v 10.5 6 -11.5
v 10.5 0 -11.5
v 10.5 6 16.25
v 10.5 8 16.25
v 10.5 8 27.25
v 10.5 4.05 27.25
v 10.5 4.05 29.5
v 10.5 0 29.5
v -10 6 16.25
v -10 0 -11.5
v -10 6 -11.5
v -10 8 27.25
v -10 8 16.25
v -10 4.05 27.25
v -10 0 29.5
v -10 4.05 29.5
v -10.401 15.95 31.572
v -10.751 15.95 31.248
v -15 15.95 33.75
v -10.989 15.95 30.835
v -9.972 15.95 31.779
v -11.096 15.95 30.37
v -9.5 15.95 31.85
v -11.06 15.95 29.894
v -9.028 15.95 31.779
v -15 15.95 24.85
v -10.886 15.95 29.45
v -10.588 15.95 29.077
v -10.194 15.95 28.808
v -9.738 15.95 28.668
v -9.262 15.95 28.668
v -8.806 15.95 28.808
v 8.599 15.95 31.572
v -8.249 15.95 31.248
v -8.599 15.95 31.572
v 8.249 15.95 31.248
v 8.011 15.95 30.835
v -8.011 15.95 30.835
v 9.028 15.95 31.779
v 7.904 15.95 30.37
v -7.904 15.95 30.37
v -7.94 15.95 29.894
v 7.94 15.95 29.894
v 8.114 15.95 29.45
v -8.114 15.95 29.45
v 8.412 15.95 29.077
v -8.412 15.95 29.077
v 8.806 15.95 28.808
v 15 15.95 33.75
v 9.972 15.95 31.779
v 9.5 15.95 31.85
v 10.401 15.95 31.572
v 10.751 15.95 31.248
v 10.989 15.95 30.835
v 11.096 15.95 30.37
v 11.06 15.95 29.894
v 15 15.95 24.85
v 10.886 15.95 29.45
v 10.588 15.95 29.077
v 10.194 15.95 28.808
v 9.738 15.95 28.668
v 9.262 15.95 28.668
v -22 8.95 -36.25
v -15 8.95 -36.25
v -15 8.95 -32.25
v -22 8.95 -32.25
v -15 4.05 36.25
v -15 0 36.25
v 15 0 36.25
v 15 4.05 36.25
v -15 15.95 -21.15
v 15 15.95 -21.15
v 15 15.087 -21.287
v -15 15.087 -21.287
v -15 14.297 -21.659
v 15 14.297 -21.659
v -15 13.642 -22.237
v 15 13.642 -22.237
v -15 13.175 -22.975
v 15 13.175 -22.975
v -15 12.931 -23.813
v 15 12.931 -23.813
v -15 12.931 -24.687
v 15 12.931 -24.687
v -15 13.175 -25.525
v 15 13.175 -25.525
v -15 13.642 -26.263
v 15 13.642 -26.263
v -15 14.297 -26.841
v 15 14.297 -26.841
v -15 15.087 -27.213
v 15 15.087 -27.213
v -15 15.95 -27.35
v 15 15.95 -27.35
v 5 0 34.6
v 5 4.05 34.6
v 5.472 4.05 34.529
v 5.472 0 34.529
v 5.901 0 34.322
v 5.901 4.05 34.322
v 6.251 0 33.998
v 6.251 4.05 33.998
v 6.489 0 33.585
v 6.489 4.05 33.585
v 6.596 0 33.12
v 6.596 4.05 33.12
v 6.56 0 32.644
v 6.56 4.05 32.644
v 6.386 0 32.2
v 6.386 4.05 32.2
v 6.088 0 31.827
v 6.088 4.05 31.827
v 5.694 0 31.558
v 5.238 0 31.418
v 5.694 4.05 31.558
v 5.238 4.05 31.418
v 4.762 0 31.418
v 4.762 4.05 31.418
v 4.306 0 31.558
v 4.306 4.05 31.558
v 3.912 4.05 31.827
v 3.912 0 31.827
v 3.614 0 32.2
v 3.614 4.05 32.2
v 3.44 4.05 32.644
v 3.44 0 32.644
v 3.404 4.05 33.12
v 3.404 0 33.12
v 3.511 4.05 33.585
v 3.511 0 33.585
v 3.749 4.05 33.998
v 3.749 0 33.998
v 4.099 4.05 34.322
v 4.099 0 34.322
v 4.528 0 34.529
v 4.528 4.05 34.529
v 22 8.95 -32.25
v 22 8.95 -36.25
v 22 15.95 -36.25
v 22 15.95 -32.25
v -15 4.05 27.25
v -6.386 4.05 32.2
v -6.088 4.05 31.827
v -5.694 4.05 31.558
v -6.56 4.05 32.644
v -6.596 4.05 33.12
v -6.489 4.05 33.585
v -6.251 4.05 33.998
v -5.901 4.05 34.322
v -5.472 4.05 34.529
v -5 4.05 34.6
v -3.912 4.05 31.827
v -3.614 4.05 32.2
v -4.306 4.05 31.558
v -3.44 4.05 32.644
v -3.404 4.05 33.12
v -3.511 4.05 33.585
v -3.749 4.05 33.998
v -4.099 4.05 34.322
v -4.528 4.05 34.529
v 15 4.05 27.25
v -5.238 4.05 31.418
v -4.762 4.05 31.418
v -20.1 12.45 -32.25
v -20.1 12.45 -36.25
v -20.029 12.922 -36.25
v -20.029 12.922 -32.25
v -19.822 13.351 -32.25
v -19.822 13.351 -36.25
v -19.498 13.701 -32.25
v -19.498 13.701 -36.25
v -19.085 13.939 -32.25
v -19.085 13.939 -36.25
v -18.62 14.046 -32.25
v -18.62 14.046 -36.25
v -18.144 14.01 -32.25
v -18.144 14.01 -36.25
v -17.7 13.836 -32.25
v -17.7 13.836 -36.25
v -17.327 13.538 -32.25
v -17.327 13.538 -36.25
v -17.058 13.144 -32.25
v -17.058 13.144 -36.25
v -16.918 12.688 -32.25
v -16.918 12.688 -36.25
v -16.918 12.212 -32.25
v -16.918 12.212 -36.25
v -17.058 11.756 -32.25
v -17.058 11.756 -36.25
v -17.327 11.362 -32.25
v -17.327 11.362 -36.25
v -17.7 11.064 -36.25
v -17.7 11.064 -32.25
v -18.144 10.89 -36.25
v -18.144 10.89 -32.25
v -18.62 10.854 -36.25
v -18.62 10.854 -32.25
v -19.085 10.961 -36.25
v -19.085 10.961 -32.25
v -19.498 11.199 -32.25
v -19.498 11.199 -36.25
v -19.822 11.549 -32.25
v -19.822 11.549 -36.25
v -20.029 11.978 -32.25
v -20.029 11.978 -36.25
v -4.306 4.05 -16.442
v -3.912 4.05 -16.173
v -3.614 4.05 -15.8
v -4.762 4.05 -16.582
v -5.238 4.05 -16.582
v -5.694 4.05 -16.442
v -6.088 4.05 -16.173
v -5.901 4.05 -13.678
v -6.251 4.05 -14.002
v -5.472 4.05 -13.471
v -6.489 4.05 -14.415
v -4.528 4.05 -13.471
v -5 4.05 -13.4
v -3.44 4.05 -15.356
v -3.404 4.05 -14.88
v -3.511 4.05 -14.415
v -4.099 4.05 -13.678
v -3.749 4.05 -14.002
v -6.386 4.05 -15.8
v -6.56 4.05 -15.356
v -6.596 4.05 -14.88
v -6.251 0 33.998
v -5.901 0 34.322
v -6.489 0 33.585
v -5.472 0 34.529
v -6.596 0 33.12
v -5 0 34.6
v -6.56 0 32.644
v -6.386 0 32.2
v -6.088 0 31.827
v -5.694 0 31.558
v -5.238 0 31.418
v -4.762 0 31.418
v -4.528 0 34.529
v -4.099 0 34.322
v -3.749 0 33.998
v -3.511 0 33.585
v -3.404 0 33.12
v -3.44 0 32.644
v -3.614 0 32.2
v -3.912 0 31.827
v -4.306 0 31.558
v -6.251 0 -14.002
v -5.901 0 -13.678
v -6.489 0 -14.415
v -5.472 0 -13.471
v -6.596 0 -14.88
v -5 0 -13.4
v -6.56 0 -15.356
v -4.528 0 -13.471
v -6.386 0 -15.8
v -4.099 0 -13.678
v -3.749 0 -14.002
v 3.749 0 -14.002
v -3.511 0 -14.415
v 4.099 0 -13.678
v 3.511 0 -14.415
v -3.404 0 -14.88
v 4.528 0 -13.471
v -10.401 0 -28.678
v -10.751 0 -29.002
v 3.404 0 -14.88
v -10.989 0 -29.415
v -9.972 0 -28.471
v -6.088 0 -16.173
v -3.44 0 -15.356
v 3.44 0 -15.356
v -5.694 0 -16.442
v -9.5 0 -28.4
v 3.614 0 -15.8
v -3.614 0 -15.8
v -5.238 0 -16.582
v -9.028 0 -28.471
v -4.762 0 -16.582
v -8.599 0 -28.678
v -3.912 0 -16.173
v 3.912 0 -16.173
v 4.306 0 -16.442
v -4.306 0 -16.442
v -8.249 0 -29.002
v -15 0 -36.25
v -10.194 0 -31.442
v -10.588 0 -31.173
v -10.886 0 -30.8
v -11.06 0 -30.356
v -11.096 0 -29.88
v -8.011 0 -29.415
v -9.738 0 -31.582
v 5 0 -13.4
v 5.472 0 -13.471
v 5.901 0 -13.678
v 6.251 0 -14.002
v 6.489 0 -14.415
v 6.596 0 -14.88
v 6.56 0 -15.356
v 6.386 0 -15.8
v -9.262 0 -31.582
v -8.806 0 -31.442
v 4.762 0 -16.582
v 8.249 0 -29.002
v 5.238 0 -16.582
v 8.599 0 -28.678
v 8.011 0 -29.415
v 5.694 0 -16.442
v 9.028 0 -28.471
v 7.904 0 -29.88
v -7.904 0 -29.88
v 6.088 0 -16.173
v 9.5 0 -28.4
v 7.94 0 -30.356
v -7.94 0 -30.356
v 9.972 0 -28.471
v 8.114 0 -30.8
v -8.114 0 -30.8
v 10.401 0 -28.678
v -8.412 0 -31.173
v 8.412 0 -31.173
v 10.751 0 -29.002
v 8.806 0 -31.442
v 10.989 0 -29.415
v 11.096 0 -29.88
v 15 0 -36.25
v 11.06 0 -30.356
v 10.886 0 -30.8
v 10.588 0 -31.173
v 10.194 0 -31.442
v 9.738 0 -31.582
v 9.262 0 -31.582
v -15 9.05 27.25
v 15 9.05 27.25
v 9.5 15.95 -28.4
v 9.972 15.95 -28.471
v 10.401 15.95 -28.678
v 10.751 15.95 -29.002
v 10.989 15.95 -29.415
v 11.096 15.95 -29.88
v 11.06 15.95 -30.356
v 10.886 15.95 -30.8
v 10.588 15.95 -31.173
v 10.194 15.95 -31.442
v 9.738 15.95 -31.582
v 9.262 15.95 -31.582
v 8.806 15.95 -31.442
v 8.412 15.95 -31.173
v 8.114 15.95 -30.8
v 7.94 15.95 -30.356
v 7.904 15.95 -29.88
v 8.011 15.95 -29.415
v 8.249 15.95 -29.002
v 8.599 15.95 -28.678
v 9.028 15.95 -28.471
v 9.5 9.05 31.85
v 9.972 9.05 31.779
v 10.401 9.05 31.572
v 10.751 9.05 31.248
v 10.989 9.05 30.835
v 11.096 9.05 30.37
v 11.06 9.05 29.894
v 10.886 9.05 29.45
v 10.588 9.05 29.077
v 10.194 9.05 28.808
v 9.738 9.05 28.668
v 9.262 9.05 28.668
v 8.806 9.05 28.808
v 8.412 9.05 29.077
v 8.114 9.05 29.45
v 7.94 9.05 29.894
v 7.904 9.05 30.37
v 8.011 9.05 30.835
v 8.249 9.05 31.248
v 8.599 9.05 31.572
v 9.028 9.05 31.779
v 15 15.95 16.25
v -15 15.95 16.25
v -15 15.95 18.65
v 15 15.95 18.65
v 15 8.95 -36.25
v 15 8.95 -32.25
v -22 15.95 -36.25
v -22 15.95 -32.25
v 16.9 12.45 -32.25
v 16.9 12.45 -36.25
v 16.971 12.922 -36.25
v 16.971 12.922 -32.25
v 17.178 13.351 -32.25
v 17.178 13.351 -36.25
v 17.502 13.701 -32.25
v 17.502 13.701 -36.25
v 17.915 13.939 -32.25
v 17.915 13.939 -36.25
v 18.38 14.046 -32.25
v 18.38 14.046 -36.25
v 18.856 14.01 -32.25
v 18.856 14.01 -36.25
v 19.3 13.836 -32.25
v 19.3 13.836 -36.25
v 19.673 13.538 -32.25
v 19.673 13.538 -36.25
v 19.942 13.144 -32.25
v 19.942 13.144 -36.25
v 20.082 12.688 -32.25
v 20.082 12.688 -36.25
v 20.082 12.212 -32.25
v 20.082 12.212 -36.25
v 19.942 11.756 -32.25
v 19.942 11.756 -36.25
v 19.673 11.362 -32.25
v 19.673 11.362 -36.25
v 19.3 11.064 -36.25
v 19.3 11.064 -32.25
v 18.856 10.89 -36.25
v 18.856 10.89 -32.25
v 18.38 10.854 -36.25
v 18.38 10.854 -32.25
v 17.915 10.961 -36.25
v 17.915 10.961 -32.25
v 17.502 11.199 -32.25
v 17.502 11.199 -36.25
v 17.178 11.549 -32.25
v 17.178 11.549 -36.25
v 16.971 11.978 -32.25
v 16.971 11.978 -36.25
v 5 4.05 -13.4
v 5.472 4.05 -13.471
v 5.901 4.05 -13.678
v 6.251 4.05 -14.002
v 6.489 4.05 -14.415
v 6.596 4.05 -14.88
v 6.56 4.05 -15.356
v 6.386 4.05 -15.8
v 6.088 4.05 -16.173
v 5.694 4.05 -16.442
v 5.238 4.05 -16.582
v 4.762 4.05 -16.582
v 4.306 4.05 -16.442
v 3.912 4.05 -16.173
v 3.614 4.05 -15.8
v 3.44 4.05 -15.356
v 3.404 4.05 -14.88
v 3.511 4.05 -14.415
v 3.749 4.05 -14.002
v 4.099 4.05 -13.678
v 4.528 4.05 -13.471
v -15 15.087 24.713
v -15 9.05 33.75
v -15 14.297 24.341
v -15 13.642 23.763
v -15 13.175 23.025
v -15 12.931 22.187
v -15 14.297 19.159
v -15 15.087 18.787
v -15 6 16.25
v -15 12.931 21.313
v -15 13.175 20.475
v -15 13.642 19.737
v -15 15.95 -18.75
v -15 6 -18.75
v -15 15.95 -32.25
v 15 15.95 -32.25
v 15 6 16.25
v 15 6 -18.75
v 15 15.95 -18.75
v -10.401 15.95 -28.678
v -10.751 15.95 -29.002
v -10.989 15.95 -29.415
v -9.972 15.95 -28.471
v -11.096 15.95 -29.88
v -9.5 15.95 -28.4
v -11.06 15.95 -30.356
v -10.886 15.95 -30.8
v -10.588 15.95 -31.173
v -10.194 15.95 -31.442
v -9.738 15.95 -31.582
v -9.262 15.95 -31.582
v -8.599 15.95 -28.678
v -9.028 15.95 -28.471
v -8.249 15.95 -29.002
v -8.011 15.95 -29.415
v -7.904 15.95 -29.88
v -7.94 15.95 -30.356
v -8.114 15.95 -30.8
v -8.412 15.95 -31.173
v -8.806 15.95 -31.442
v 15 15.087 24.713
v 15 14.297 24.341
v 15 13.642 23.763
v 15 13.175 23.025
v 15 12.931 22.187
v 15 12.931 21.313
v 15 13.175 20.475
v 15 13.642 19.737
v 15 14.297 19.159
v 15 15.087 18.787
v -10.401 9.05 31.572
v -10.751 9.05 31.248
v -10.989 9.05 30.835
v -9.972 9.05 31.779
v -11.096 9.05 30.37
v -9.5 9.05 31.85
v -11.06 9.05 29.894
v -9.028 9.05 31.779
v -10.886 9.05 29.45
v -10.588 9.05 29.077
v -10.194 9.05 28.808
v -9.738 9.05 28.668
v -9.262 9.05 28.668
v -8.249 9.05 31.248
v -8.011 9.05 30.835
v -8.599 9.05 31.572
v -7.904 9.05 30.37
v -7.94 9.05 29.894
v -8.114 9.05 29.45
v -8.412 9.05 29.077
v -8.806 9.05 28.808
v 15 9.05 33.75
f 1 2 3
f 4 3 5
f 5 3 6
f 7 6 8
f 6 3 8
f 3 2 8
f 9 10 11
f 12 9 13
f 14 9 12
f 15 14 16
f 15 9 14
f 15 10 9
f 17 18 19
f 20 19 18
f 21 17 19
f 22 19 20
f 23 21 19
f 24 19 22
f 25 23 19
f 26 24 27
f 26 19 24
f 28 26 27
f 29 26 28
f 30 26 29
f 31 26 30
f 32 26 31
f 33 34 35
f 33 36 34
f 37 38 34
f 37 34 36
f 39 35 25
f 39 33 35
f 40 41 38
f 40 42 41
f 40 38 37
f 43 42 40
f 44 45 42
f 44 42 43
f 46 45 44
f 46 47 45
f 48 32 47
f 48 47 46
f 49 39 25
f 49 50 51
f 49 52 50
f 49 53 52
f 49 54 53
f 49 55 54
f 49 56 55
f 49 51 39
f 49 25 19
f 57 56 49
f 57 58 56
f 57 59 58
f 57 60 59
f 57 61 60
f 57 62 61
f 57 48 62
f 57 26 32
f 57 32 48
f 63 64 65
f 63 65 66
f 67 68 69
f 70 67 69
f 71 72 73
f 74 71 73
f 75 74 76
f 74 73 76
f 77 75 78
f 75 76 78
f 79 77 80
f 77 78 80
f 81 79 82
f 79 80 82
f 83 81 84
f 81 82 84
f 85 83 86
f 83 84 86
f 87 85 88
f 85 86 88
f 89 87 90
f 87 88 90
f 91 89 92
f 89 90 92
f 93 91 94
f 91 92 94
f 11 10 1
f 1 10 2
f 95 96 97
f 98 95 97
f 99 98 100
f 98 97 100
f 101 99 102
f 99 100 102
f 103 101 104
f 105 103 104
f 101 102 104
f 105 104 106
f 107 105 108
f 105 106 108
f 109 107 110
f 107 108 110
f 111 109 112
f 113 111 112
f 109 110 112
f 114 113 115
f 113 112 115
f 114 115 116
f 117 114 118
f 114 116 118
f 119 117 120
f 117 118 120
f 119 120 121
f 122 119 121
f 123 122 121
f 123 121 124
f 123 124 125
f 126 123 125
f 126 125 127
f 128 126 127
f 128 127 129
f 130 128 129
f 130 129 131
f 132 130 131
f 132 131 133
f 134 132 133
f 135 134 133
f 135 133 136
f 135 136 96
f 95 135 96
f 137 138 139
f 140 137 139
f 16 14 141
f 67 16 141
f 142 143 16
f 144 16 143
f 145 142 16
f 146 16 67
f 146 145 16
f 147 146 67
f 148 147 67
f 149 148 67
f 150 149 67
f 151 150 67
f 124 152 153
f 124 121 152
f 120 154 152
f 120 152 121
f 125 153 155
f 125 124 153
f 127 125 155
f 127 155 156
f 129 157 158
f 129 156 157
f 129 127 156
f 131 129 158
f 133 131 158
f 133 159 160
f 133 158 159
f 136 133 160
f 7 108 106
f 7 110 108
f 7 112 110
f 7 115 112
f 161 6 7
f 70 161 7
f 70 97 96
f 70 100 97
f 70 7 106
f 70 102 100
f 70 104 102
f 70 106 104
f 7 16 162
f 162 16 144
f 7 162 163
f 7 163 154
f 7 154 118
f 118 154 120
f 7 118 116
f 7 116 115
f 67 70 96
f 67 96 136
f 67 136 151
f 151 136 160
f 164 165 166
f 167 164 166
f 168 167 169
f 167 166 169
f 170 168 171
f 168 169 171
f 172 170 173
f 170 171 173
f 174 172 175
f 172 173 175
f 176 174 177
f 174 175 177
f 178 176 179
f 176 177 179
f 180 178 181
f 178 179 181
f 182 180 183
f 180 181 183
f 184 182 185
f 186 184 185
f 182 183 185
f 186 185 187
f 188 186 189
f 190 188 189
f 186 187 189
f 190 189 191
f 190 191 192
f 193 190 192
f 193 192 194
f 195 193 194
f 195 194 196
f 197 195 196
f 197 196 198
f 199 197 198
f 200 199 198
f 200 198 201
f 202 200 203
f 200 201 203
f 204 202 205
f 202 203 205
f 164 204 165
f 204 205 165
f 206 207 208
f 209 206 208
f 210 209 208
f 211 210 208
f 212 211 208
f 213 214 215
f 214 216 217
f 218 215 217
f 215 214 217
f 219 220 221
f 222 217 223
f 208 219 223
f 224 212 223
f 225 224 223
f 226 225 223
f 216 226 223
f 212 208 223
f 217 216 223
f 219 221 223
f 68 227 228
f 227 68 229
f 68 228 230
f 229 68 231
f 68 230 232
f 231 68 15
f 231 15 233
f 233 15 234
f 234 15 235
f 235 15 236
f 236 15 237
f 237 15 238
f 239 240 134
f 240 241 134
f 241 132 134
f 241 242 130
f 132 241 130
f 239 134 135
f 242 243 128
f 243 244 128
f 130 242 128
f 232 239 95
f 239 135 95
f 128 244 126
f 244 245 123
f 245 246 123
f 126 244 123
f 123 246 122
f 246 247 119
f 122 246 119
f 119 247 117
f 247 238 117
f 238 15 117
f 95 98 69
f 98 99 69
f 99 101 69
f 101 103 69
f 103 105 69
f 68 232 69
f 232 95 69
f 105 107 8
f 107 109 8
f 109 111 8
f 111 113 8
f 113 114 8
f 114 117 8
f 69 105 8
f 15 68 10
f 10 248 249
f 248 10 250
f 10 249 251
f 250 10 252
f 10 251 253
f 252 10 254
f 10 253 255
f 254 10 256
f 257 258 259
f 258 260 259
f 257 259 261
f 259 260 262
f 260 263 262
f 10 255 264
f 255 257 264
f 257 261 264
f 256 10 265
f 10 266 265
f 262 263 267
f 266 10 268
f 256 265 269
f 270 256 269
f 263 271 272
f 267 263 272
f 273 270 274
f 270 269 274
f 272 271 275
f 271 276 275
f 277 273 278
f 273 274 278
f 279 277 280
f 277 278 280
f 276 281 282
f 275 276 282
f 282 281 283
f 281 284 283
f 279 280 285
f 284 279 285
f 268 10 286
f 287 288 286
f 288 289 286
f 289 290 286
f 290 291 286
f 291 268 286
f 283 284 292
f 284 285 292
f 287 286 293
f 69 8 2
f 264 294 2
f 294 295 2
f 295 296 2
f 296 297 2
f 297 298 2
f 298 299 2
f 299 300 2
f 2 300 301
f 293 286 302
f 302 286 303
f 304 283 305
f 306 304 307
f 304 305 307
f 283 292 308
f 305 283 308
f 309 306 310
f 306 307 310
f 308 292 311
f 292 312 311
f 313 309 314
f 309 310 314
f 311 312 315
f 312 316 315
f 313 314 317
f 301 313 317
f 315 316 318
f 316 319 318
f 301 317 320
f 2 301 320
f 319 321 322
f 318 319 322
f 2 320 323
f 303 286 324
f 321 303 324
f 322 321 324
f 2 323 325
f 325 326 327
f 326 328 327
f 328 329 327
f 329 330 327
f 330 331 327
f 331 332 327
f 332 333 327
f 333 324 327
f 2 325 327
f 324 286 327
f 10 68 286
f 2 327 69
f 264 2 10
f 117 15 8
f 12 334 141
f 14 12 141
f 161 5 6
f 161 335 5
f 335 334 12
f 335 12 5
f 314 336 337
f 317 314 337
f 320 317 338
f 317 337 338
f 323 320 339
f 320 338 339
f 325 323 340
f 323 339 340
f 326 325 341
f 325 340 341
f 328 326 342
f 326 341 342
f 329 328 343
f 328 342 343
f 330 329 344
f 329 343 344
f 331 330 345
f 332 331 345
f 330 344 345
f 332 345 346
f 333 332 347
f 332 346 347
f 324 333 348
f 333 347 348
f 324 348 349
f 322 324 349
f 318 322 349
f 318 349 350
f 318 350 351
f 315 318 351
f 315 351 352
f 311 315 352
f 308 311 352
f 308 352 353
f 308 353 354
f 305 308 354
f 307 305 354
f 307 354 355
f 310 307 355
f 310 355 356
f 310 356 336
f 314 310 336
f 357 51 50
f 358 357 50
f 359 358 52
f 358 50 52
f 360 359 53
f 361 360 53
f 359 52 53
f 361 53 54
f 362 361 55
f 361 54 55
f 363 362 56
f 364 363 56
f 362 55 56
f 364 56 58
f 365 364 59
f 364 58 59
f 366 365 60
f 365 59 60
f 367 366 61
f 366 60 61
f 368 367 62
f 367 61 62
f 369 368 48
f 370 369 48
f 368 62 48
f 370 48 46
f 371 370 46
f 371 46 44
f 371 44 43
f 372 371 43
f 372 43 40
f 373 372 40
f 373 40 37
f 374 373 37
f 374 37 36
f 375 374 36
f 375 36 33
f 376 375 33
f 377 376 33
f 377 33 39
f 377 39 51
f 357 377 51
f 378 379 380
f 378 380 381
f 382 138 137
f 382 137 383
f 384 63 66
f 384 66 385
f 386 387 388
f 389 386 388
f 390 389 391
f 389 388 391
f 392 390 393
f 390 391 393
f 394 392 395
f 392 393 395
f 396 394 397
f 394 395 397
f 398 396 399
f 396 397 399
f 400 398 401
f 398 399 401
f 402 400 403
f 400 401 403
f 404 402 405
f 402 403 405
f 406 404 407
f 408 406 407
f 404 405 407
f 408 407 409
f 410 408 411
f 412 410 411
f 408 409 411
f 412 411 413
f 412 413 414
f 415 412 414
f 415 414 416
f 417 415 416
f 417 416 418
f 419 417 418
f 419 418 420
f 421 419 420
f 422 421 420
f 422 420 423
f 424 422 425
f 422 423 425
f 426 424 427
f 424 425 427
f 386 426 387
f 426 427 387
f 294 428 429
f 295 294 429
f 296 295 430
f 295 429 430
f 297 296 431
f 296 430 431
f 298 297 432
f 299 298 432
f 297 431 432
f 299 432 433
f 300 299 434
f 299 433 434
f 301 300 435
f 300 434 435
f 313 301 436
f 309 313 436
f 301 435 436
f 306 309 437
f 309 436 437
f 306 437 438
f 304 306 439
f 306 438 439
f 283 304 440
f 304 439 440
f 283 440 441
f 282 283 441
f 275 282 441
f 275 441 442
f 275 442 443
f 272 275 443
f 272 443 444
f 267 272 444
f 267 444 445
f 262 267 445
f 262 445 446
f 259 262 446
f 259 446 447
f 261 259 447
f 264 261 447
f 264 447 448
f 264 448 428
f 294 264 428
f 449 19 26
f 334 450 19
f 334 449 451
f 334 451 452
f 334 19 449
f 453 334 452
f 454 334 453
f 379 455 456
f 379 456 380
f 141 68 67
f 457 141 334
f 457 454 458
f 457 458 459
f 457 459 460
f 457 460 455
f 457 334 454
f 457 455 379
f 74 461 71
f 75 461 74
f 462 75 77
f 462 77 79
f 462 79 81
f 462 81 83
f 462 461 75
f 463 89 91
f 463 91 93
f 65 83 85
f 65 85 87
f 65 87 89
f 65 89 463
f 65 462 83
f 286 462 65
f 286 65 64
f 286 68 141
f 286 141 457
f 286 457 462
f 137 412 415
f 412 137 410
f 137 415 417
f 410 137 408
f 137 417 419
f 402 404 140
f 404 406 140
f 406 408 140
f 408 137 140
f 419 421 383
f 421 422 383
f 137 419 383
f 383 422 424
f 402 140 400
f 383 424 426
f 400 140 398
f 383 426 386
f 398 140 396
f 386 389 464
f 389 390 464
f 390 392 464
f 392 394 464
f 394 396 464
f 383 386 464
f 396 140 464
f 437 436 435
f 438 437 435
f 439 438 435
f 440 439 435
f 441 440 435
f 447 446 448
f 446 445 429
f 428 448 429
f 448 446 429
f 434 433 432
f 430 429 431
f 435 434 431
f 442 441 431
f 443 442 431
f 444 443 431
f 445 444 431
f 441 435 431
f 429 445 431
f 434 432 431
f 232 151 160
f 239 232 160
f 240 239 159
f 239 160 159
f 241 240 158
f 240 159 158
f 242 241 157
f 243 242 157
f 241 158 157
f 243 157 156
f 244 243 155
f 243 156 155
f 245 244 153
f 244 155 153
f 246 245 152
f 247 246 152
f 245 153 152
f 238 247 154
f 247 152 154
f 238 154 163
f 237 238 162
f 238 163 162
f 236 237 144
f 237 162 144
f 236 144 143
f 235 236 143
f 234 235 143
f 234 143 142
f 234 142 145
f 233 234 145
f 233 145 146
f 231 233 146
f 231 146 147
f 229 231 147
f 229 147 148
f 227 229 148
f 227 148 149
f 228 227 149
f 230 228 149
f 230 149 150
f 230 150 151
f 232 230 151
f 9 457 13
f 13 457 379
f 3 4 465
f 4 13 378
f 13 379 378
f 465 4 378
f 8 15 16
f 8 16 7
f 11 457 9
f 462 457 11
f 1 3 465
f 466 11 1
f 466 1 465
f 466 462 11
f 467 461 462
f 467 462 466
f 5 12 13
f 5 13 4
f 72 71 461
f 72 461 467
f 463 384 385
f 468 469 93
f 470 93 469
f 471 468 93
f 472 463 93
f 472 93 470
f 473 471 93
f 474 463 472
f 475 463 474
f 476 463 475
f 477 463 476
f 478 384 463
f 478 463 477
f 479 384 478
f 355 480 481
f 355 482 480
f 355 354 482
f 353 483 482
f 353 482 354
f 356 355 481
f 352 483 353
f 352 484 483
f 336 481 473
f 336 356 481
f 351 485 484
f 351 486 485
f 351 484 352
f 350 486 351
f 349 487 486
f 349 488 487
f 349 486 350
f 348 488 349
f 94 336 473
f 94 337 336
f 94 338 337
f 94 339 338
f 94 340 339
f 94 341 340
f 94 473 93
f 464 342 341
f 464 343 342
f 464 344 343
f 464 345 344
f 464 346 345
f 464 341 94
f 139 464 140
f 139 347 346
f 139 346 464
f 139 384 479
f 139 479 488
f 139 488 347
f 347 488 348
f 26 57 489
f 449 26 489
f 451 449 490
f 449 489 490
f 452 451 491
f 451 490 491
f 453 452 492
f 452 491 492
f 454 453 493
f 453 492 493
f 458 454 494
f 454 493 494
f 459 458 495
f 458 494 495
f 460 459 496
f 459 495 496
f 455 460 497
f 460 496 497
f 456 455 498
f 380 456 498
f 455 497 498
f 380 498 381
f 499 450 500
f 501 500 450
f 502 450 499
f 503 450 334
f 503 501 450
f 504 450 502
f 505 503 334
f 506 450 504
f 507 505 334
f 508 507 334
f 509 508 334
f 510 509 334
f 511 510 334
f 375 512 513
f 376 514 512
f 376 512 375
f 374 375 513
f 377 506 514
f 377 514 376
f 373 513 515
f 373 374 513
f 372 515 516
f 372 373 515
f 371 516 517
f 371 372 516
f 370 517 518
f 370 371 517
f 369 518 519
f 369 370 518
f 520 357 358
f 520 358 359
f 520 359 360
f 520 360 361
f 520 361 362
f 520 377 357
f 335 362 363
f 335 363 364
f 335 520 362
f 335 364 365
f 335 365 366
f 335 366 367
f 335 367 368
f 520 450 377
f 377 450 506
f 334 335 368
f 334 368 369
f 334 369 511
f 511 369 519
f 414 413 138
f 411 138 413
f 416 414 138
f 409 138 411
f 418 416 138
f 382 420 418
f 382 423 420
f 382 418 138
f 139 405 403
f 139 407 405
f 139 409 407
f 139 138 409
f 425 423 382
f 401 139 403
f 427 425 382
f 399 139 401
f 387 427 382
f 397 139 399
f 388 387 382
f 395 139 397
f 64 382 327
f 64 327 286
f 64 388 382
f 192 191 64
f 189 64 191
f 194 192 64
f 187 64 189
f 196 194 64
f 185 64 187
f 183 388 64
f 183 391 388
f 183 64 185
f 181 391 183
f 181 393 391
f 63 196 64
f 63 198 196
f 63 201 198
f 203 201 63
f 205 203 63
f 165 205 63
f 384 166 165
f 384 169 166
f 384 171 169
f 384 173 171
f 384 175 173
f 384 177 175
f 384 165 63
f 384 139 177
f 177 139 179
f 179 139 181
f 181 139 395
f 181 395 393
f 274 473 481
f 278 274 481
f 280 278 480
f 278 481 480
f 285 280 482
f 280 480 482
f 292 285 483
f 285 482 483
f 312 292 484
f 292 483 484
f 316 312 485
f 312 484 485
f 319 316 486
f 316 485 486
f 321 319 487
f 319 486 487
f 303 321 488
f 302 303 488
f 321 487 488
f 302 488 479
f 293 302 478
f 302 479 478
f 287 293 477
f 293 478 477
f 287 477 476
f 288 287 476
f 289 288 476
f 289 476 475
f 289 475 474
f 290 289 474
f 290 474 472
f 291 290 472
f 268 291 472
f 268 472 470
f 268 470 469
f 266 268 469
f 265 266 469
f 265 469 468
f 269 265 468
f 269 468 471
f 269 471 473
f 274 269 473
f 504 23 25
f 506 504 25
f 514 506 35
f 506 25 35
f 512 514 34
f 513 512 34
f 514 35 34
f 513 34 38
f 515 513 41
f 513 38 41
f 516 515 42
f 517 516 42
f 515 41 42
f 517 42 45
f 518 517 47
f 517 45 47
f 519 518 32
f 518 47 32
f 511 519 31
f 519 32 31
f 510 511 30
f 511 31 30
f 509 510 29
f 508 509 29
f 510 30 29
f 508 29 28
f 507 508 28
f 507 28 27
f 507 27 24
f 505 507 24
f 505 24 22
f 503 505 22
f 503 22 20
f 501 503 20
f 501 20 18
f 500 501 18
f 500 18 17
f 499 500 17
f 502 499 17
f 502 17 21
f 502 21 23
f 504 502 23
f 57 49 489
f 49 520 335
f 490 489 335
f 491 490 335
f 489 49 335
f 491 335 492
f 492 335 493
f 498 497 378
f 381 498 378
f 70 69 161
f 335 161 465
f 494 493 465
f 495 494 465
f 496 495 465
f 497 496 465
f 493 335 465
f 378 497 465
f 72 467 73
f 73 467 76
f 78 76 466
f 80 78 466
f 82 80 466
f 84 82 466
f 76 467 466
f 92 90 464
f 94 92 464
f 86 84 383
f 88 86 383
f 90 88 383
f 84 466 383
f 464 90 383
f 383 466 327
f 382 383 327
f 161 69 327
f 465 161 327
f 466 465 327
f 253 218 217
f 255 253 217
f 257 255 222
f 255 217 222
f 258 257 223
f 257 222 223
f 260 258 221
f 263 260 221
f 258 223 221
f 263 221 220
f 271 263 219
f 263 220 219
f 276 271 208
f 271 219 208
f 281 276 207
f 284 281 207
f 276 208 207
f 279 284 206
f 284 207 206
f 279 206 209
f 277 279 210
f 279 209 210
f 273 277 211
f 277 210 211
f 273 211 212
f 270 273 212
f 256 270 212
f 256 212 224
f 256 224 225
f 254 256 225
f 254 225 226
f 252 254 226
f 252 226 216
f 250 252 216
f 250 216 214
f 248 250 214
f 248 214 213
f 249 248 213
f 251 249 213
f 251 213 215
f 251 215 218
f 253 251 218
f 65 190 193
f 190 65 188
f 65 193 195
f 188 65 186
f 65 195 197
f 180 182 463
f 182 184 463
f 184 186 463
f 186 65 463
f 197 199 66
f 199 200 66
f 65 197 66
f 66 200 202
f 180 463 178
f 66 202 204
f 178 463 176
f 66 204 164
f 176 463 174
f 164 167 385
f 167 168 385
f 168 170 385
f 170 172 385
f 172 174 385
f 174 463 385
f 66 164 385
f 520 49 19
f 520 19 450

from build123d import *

# Parameters (mm, degrees)
SKETCH3_W           = 30
SKETCH3_H           = 72.5
BOSS_EXTRUDE2_DEPTH = 15.95
SKETCH7_W           = 20.5
SKETCH7_H           = 41
CUT_EXTRUDE5_DEPTH  = 8
SKETCH8_W           = 30
SKETCH8_H           = 35
CUT_EXTRUDE6_DEPTH  = 9.95
CUT_EXTRUDE7_DEPTH  = 50.683649222
SKETCH10_R          = 3.1
CUT_EXTRUDE8_DEPTH  = 50.683649222
CUT_EXTRUDE9_REACH  = 44.349
SKETCH11_R          = 1.6
CUT_EXTRUDE10_REACH = 42.996
SKETCH12_R          = 1.6
SKETCH13_W          = 7
SKETCH13_H          = 7
SKETCH13_R          = 1.6
BOSS_EXTRUDE3_DEPTH = 4


with BuildPart() as part:
    # Sketch3 → Boss-Extrude2 (new body)
    with BuildSketch(Plane(origin=(0, 0, 0), x_dir=(1, 0, 0), z_dir=(0, 1, 0))):
        Rectangle(SKETCH3_W, SKETCH3_H)
    extrude(amount=BOSS_EXTRUDE2_DEPTH)

    # Sketch7 → Cut-Extrude5 (cut)
    with BuildSketch(Plane.XZ):
        with Locations((0.25, 9)):
            Rectangle(SKETCH7_W, SKETCH7_H)
    extrude(amount=-CUT_EXTRUDE5_DEPTH, mode=Mode.SUBTRACT)

    # Sketch8 → Cut-Extrude6 (cut)
    with BuildSketch(Plane(origin=(0, 15.95, 0), x_dir=(1, 0, 0), z_dir=(0, 1, 0))):
        with Locations((0, 1.25)):
            Rectangle(SKETCH8_W, SKETCH8_H)
    extrude(amount=-CUT_EXTRUDE6_DEPTH, mode=Mode.SUBTRACT)

    # Sketch9 → Cut-Extrude7 (cut, through all)
    with BuildSketch(Plane(origin=(15, 0, 0), x_dir=(0, 0, -1), z_dir=(1, 0, 0))):
        Polygon((-36.25, 15.95), (-33.75, 15.95), (-33.75, 9.05), (-27.25, 9.05), (-27.25, 4.05), (-36.25, 4.05), align=None)
    extrude(amount=-CUT_EXTRUDE7_DEPTH, mode=Mode.SUBTRACT)

    # Sketch10 → Cut-Extrude8 (cut, through all)
    with BuildSketch(Plane(origin=(15, 0, 0), x_dir=(0, 0, -1), z_dir=(1, 0, 0))):
        with Locations((24.25, 16)):
            Circle(SKETCH10_R)
        with Locations((-21.75, 16)):
            Circle(SKETCH10_R)
    extrude(amount=-CUT_EXTRUDE8_DEPTH, mode=Mode.SUBTRACT)

    # Sketch11 → Cut-Extrude9 (cut, up to next)
    with BuildSketch(Plane(origin=(0, 15.95, 0), x_dir=(1, 0, 0), z_dir=(0, 1, 0)), mode=Mode.PRIVATE) as cut_extrude9_sk1:
        with Locations(Location((-9.5, -30.25, 0), (0, 0, 270))):
            Circle(SKETCH11_R)
    cut_extrude9_tool1 = extrude(cut_extrude9_sk1.sketch, amount=-CUT_EXTRUDE9_REACH, mode=Mode.PRIVATE) & part.part
    # Sketch11 → Cut-Extrude9 (cut, up to next)
    with BuildSketch(Plane(origin=(0, 15.95, 0), x_dir=(1, 0, 0), z_dir=(0, 1, 0)), mode=Mode.PRIVATE) as cut_extrude9_sk2:
        with Locations(Location((9.5, -30.25, 0), (0, 0, 270))):
            Circle(SKETCH11_R)
    cut_extrude9_tool2 = extrude(cut_extrude9_sk2.sketch, amount=-CUT_EXTRUDE9_REACH, mode=Mode.PRIVATE) & part.part
    # Sketch11 → Cut-Extrude9 (cut, up to next)
    with BuildSketch(Plane(origin=(0, 15.95, 0), x_dir=(1, 0, 0), z_dir=(0, 1, 0)), mode=Mode.PRIVATE) as cut_extrude9_sk3:
        with Locations(Location((-9.5, 30, 0), (0, 0, 270))):
            Circle(SKETCH11_R)
    cut_extrude9_tool3 = extrude(cut_extrude9_sk3.sketch, amount=-CUT_EXTRUDE9_REACH, mode=Mode.PRIVATE) & part.part
    # Sketch11 → Cut-Extrude9 (cut, up to next)
    with BuildSketch(Plane(origin=(0, 15.95, 0), x_dir=(1, 0, 0), z_dir=(0, 1, 0)), mode=Mode.PRIVATE) as cut_extrude9_sk4:
        with Locations(Location((9.5, 30, 0), (0, 0, 270))):
            Circle(SKETCH11_R)
    cut_extrude9_tool4 = extrude(cut_extrude9_sk4.sketch, amount=-CUT_EXTRUDE9_REACH, mode=Mode.PRIVATE) & part.part
    add(cut_extrude9_tool1.solids().sort_by_distance((-9.5, 15.95, 30.25))[0], mode=Mode.SUBTRACT)
    add(cut_extrude9_tool2.solids().sort_by_distance((9.5, 15.95, 30.25))[0], mode=Mode.SUBTRACT)
    add(cut_extrude9_tool3.solids().sort_by_distance((-9.5, 15.95, -30))[0], mode=Mode.SUBTRACT)
    add(cut_extrude9_tool4.solids().sort_by_distance((9.5, 15.95, -30))[0], mode=Mode.SUBTRACT)

    # Sketch12 → Cut-Extrude10 (cut, up to next)
    with BuildSketch(Plane(origin=(0, 4.05, 0), x_dir=(1, 0, 0), z_dir=(0, 1, 0)), mode=Mode.PRIVATE) as cut_extrude10_sk1:
        with Locations(Location((-5, -33, 0), (0, 0, 270))):
            Circle(SKETCH12_R)
    cut_extrude10_tool1 = extrude(cut_extrude10_sk1.sketch, amount=-CUT_EXTRUDE10_REACH, mode=Mode.PRIVATE) & part.part
    # Sketch12 → Cut-Extrude10 (cut, up to next)
    with BuildSketch(Plane(origin=(0, 4.05, 0), x_dir=(1, 0, 0), z_dir=(0, 1, 0)), mode=Mode.PRIVATE) as cut_extrude10_sk2:
        with Locations(Location((5, -33, 0), (0, 0, 270))):
            Circle(SKETCH12_R)
    cut_extrude10_tool2 = extrude(cut_extrude10_sk2.sketch, amount=-CUT_EXTRUDE10_REACH, mode=Mode.PRIVATE) & part.part
    # Sketch12 → Cut-Extrude10 (cut, up to next)
    with BuildSketch(Plane(origin=(0, 4.05, 0), x_dir=(1, 0, 0), z_dir=(0, 1, 0)), mode=Mode.PRIVATE) as cut_extrude10_sk3:
        with Locations(Location((-5, 15, 0), (0, 0, 270))):
            Circle(SKETCH12_R)
    cut_extrude10_tool3 = extrude(cut_extrude10_sk3.sketch, amount=-CUT_EXTRUDE10_REACH, mode=Mode.PRIVATE) & part.part
    # Sketch12 → Cut-Extrude10 (cut, up to next)
    with BuildSketch(Plane(origin=(0, 4.05, 0), x_dir=(1, 0, 0), z_dir=(0, 1, 0)), mode=Mode.PRIVATE) as cut_extrude10_sk4:
        with Locations(Location((5, 15, 0), (0, 0, 270))):
            Circle(SKETCH12_R)
    cut_extrude10_tool4 = extrude(cut_extrude10_sk4.sketch, amount=-CUT_EXTRUDE10_REACH, mode=Mode.PRIVATE) & part.part
    add(cut_extrude10_tool1.solids().sort_by_distance((-5, 4.05, 33))[0], mode=Mode.SUBTRACT)
    add(cut_extrude10_tool2.solids().sort_by_distance((5, 4.05, 33))[0], mode=Mode.SUBTRACT)
    add(cut_extrude10_tool3.solids().sort_by_distance((-5, 4.05, -15))[0], mode=Mode.SUBTRACT)
    add(cut_extrude10_tool4.solids().sort_by_distance((5, 4.05, -15))[0], mode=Mode.SUBTRACT)

    # Sketch13 → Boss-Extrude3 (add)
    # profile 1 of 2: a face of its own
    with BuildSketch(Plane(origin=(0, 0, -36.25), x_dir=(-1, 0, 0), z_dir=(0, 0, -1))):
        with Locations((18.5, 12.45)):
            Rectangle(SKETCH13_W, SKETCH13_H)
        with Locations((18.5, 12.45)):
            Circle(SKETCH13_R, mode=Mode.SUBTRACT)
    # profile 2 of 2: a face of its own
    with BuildSketch(Plane(origin=(0, 0, -36.25), x_dir=(-1, 0, 0), z_dir=(0, 0, -1))):
        with Locations((-18.5, 12.45)):
            Rectangle(SKETCH13_W, SKETCH13_H)
        with Locations((-18.5, 12.45)):
            Circle(SKETCH13_R, mode=Mode.SUBTRACT)
    extrude(amount=-BOSS_EXTRUDE3_DEPTH)


solid = part.part
